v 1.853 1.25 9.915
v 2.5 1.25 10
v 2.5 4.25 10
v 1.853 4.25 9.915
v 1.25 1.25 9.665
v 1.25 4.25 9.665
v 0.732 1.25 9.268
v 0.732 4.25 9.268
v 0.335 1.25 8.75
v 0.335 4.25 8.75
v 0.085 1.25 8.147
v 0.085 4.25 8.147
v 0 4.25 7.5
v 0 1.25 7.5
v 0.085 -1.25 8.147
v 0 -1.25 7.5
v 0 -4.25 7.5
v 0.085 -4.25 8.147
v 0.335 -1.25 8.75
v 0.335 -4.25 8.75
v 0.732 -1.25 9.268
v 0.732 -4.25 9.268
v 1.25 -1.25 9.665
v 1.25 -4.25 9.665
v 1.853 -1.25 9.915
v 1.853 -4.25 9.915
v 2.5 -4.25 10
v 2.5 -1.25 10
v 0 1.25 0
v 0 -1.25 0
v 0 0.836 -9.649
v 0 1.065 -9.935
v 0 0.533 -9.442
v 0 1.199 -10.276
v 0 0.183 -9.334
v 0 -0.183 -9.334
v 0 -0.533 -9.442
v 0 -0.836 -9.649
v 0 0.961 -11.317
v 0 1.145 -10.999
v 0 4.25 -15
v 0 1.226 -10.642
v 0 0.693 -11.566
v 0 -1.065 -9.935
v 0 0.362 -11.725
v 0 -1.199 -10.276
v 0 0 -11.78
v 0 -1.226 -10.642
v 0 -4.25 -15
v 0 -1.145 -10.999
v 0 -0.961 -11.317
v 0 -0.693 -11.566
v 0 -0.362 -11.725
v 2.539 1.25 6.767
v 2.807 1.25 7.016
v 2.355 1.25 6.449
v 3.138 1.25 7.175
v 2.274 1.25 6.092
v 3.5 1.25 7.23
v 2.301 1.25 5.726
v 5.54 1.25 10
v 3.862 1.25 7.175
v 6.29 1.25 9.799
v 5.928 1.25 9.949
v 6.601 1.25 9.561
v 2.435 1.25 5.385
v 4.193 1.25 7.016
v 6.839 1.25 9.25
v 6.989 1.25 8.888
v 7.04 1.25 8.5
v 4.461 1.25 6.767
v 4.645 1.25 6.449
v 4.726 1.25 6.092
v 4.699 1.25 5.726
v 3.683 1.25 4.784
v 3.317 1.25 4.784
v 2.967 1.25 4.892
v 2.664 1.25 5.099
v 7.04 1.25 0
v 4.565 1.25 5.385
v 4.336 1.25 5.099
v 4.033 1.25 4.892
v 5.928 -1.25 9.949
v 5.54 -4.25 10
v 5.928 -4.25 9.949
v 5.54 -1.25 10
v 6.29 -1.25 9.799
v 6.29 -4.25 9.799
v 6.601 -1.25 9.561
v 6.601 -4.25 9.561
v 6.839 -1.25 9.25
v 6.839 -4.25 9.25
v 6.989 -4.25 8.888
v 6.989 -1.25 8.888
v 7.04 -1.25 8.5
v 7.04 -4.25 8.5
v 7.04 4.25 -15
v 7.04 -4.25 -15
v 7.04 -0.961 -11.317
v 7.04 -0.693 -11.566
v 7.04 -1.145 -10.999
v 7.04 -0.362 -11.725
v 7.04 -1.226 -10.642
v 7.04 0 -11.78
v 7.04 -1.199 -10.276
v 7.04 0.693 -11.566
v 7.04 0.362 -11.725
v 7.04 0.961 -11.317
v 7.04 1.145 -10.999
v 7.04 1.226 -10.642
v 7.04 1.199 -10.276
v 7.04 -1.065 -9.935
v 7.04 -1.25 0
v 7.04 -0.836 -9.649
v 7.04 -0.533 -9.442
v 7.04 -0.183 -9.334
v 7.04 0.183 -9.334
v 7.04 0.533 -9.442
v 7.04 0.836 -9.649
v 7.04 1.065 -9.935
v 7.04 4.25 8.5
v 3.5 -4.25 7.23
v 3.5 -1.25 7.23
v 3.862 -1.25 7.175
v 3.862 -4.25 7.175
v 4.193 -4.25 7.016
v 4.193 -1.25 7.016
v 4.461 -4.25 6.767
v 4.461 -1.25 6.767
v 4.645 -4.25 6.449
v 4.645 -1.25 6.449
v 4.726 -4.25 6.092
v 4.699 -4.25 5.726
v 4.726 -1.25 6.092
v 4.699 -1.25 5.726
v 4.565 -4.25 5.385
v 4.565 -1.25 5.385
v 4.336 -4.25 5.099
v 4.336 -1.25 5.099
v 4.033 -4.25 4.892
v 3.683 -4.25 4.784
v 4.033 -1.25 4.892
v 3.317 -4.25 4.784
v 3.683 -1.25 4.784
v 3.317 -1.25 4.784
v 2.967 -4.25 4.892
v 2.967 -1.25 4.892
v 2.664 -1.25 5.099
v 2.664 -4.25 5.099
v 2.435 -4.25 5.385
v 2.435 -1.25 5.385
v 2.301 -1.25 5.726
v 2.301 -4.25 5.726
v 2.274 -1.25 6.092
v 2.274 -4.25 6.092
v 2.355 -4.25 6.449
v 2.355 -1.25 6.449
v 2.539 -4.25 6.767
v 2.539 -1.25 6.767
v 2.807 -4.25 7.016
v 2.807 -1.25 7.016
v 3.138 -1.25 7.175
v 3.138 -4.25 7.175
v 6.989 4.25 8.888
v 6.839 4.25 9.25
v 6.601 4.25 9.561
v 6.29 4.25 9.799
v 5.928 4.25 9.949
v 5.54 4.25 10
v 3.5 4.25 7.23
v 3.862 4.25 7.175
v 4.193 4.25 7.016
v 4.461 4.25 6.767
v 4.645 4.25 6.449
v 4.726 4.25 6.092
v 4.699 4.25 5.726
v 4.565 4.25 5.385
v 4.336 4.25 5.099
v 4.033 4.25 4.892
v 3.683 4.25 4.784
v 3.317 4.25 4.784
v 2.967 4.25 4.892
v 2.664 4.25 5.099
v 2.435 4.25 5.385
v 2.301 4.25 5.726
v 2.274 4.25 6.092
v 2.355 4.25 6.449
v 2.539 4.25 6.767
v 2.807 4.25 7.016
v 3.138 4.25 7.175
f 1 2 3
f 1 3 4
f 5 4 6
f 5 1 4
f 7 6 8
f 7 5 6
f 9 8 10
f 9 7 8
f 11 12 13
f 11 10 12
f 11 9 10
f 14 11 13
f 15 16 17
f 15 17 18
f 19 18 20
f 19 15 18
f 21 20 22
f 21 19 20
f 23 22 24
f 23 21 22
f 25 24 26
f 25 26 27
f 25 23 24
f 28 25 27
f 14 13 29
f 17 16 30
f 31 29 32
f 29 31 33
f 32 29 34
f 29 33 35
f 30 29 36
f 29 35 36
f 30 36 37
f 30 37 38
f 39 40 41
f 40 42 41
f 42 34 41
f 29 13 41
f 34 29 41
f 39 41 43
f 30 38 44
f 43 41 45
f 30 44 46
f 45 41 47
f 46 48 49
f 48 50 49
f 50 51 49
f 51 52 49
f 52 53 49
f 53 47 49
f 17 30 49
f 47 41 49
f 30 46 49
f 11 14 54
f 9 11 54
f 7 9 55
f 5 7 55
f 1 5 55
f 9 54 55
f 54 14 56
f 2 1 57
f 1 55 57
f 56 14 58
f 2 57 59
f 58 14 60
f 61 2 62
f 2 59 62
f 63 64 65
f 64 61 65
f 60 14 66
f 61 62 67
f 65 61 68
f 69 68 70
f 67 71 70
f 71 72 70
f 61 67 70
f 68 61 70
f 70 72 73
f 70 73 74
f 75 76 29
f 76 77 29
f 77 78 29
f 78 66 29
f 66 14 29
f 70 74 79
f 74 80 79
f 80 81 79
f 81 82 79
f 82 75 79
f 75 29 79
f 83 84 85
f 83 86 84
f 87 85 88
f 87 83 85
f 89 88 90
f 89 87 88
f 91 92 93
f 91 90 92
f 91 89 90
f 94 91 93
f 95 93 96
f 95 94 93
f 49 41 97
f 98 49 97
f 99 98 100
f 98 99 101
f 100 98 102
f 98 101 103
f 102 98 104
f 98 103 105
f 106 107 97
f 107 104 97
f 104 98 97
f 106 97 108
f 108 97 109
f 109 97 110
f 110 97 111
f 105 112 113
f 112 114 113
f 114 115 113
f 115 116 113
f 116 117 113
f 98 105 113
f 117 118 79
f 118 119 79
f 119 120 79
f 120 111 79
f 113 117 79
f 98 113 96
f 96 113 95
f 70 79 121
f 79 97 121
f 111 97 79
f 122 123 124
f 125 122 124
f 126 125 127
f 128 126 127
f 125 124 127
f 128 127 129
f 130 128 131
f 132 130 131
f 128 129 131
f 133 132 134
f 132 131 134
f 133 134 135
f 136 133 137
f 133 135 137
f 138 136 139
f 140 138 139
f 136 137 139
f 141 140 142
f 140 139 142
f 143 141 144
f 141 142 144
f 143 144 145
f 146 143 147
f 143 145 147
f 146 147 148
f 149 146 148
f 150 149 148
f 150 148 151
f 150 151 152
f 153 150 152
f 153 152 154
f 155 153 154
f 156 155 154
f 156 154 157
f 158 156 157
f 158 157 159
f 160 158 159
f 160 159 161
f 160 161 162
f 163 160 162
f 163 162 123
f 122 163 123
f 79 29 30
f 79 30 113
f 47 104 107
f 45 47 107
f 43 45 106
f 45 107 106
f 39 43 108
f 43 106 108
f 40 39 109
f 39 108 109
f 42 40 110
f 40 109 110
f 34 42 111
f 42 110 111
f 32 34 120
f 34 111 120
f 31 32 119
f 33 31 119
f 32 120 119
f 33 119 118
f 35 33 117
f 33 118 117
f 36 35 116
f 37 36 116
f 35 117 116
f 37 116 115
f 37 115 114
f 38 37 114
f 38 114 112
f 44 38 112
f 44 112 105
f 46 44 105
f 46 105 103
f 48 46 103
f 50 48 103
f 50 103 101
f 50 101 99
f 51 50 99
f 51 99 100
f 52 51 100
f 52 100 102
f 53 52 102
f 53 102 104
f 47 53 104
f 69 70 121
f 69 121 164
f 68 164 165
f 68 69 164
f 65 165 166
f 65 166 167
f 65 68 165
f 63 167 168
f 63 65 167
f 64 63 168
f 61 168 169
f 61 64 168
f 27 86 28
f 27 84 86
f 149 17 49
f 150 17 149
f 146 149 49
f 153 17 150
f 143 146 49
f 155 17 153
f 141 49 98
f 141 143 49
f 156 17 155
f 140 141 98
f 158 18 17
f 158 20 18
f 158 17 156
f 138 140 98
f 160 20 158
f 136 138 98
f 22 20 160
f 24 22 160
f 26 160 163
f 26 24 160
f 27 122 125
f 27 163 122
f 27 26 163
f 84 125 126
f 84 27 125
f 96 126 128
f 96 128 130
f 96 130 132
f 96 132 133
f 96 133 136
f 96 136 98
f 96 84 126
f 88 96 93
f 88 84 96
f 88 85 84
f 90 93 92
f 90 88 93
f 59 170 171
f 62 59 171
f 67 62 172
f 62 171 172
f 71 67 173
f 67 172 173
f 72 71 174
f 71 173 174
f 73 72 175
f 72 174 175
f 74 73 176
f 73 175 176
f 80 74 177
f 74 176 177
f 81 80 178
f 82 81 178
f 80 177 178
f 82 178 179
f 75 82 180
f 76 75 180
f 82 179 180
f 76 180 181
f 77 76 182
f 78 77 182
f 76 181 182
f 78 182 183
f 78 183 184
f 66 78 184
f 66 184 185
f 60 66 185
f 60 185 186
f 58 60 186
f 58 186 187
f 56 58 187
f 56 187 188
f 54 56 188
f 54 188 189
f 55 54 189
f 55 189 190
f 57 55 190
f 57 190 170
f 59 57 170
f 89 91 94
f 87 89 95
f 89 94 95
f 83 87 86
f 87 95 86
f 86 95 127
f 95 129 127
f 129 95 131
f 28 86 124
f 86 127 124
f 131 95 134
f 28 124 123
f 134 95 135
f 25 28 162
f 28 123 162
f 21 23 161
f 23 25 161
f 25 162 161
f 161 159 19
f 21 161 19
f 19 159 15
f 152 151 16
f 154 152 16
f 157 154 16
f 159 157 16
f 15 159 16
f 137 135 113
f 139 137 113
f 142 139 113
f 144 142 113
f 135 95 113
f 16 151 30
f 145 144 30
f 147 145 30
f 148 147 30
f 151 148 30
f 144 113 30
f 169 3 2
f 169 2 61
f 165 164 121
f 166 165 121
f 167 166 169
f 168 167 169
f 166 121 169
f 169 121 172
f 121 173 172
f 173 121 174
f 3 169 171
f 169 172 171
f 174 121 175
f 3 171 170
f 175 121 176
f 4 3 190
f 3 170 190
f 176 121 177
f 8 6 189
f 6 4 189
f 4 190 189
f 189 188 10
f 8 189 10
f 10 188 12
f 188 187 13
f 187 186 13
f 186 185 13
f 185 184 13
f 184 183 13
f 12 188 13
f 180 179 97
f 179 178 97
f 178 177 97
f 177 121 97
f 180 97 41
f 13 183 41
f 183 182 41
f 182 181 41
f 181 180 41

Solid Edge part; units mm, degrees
sketch "Sketch1" plane through (0, 0, 0) normal (0, 0, 1) x (1, 0, 0)
  line L0 (0, 1.25) -> (10, 1.25)
  line L1 (10, 1.25) -> (10, 4.25)
  line L2 (10, 4.25) -> (0, 4.25)
  line L3 (0, 4.25) -> (0, 1.25)
  dimension "D1" = 3
  dimension "D2" = 10
  dimension "D3" = 1.25
extrude "Protrusion1" add sketch "Sketch1" along normal blind 10
mirror "Mirror1" about plane through (0, 0, 0) normal (0, -1, 0) of "Protrusion1"
sketch "Sketch2" plane through (3, -2.75, 0) normal (0, 0, -1) x (0, 1, 0)
  line L0 (-1.5, 7) -> (7, 7)
  line L1 (7, 7) -> (7, -3)
  line L2 (7, -3) -> (-1.5, -3)
  line L3 (-1.5, -3) -> (-1.5, 7)
extrude "Extrusionsausprägung_2" add sketch "Sketch2" along normal blind 15
hole "Bohrung_1" at (3.5, 4.25, 6) direction (0, -1, 0) diameter 2.459 end through all
fillet "Verrundung_1" radius 2.5 2 edges at (0, -2.75, 10) (0, 2.75, 10)
sketch "Sketch3" plane through (5, 4.25, 0) normal (0, 1, 0) x (-1, 0, 0)
  line L0 (-2.04, -8.976) -> (-2.04, 16.024)
  line L1 (-2.04, -8.976) -> (-2.04, -11.4934)
  dimension "D1" = 3.54
  dimension "D2" = 25
extrude "Extrusionsausschnitt_1" cut sketch "Sketch3" against normal blind 92.5 material side at (7.09, 4.25, 3.524)
hole "Bohrung_2" at (7.04, 0, -10.55) direction (-1, 0, 0) diameter 2.459 end up to next
fillet "Verrundung_2" radius 1.5 2 edges at (7.04, -2.75, 10) (7.04, 2.75, 10)
